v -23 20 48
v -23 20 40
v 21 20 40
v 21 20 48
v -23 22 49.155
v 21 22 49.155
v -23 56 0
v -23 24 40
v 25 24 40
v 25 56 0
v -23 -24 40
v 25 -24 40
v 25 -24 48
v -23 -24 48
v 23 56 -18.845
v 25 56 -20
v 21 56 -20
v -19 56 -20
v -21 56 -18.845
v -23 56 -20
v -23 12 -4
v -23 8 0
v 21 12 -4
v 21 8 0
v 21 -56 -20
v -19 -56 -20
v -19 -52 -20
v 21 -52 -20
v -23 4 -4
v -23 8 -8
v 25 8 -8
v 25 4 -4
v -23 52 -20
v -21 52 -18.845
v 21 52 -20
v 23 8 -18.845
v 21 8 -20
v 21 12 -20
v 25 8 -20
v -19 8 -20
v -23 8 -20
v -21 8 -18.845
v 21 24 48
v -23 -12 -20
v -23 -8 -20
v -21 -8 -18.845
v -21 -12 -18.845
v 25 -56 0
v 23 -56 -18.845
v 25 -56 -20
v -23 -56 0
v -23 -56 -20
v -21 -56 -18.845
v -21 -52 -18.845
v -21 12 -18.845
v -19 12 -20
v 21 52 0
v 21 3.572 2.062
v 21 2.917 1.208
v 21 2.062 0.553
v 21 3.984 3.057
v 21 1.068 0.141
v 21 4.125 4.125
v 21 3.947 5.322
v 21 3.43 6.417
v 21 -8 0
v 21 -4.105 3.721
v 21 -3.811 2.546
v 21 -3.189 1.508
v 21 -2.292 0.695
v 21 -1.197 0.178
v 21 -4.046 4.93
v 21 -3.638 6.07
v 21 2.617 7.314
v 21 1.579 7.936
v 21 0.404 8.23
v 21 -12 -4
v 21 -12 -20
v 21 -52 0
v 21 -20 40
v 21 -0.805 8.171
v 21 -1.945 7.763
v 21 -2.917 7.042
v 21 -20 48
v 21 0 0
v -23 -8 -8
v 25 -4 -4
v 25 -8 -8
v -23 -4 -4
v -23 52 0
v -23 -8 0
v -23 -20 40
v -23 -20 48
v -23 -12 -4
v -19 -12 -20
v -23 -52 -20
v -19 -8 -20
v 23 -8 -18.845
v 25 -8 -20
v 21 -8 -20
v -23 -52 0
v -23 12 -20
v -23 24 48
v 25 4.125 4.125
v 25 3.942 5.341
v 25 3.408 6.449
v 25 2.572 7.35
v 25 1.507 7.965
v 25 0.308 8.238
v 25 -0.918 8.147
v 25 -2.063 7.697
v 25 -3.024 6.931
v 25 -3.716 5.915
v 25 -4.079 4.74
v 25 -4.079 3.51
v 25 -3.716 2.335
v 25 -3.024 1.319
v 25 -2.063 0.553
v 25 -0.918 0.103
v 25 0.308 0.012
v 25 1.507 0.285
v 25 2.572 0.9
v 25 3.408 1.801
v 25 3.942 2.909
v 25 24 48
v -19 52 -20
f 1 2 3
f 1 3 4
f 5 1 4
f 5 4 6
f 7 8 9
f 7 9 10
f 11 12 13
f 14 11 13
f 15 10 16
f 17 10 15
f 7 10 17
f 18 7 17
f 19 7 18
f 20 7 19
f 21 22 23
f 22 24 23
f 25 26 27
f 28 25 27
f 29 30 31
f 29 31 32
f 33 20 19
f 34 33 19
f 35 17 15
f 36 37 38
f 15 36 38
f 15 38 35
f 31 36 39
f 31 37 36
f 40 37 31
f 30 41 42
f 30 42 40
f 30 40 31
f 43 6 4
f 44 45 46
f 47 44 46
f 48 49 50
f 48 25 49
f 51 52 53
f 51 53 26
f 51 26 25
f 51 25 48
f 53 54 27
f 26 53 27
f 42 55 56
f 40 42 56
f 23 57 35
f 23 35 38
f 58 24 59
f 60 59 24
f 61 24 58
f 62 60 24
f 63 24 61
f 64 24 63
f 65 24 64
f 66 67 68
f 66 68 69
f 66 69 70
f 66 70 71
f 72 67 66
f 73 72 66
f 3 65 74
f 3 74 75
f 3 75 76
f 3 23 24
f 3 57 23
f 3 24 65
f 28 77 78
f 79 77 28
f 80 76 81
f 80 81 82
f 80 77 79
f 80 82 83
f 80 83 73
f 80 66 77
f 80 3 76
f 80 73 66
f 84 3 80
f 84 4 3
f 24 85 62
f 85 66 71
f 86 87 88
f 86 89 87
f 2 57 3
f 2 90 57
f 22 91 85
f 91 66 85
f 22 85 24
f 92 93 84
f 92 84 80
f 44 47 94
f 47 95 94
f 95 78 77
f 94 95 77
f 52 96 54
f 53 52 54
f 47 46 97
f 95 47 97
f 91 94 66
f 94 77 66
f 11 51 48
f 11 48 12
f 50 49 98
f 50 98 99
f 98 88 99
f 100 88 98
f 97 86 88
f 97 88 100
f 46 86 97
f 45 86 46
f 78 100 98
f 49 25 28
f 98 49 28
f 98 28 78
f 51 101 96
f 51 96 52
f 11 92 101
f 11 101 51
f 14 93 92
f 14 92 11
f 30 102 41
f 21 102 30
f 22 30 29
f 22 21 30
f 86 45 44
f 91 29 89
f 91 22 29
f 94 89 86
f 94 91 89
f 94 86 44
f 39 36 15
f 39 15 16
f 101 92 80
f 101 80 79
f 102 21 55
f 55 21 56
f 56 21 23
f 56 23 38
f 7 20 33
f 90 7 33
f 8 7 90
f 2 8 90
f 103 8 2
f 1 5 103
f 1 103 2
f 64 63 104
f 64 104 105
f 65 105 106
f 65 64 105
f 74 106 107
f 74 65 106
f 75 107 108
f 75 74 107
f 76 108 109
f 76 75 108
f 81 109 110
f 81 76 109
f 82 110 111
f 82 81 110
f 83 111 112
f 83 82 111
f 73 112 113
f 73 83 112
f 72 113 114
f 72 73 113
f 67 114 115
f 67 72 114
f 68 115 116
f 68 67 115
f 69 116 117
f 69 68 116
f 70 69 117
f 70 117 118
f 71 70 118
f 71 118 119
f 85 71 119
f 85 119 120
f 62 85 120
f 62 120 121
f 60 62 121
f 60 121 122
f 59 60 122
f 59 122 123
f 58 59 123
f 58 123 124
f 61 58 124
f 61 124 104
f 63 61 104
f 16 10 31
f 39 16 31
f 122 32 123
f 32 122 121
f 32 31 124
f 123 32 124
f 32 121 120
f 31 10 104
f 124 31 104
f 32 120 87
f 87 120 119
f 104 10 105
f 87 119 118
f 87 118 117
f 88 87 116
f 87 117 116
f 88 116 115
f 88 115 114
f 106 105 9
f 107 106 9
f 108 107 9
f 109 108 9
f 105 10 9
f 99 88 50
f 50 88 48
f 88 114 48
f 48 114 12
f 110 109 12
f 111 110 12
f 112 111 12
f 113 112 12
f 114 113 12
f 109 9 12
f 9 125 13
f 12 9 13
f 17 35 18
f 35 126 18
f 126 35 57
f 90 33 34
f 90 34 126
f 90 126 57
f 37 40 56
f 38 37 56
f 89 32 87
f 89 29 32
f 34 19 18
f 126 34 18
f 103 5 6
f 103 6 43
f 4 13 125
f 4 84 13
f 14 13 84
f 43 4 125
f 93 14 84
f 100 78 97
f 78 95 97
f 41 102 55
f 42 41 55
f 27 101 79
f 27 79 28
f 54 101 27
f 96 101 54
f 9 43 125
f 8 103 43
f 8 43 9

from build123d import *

# Parameters (mm, degrees)
EXTRUDE014_DEPTH = 100
EXTRUDE010_DEPTH = 22
SKETCH009_R      = 4.125
EXTRUDE011_DEPTH = 4


with BuildPart() as extrude014:
    # Sketch012 → Extrude014 (new body, symmetric)
    with BuildSketch(Plane.XZ):
        Polygon((-20, 0), (-24, 0), (-22, 1.154701), align=None)
        Polygon((20, 0), (22, 1.154701), (24, 0), align=None)
    extrude(amount=EXTRUDE014_DEPTH, both=True)


with BuildPart() as extrude014_1:
    # Extrude014 placement: moved
    add(extrude014.part.moved(Location((1, 0, -20))))


with BuildPart() as extrude010:
    # Sketch008 → Extrude010 (new body, symmetric)
    with BuildSketch(Plane.YZ):
        Polygon((-56, 0), (-24, 40), (-24, 48), (-20, 48), (-20, 40), (-52, 0), (-52, -20), (-56, -20), align=None)
        Polygon((52, 0), (20, 40), (20, 48), (22, 49.154701), (24, 48), (24, 40), (56, 0), (56, -20), (52, -20), align=None)
        Polygon((-8, -20), (-12, -20), (-12, -4), (-8, 0), (8, 0), (12, -4), (12, -20), (8, -20), (8, -8), (4, -4), (-4, -4), (-8, -8), align=None)
    extrude(amount=EXTRUDE010_DEPTH, both=True)


with BuildPart() as stage_1_paths:
    # Sketch009 → Extrude011 (new body)
    with BuildSketch(Plane.YZ):
        Polygon((-56, 0), (-24, 40), (-24, 48), (24, 48), (24, 40), (56, 0), (56, -20), (52, -20), (12, -20), (8, -20), (8, -8), (4, -4), (-4, -4), (-8, -8), (-8, -20), (-12, -20), (-52, -20), (-56, -20), align=None)
        with Locations((0, 4.125)):
            Circle(SKETCH009_R, mode=Mode.SUBTRACT)
    extrude(amount=EXTRUDE011_DEPTH)


with BuildPart() as stage_1_paths_1:
    # Extrude011 placement: moved
    add(stage_1_paths.part.moved(Location((22, 0, 0))))

    # Fusion006: union Extrude010
    add(extrude010.part)


with BuildPart() as stage_1_paths_2:
    # Fusion006 placement: moved
    add(stage_1_paths_1.part.moved(Location((-1, 0, 0))))

    # Cut: cut Extrude014
    add(extrude014_1.part, mode=Mode.SUBTRACT)


solid = stage_1_paths_2.part
